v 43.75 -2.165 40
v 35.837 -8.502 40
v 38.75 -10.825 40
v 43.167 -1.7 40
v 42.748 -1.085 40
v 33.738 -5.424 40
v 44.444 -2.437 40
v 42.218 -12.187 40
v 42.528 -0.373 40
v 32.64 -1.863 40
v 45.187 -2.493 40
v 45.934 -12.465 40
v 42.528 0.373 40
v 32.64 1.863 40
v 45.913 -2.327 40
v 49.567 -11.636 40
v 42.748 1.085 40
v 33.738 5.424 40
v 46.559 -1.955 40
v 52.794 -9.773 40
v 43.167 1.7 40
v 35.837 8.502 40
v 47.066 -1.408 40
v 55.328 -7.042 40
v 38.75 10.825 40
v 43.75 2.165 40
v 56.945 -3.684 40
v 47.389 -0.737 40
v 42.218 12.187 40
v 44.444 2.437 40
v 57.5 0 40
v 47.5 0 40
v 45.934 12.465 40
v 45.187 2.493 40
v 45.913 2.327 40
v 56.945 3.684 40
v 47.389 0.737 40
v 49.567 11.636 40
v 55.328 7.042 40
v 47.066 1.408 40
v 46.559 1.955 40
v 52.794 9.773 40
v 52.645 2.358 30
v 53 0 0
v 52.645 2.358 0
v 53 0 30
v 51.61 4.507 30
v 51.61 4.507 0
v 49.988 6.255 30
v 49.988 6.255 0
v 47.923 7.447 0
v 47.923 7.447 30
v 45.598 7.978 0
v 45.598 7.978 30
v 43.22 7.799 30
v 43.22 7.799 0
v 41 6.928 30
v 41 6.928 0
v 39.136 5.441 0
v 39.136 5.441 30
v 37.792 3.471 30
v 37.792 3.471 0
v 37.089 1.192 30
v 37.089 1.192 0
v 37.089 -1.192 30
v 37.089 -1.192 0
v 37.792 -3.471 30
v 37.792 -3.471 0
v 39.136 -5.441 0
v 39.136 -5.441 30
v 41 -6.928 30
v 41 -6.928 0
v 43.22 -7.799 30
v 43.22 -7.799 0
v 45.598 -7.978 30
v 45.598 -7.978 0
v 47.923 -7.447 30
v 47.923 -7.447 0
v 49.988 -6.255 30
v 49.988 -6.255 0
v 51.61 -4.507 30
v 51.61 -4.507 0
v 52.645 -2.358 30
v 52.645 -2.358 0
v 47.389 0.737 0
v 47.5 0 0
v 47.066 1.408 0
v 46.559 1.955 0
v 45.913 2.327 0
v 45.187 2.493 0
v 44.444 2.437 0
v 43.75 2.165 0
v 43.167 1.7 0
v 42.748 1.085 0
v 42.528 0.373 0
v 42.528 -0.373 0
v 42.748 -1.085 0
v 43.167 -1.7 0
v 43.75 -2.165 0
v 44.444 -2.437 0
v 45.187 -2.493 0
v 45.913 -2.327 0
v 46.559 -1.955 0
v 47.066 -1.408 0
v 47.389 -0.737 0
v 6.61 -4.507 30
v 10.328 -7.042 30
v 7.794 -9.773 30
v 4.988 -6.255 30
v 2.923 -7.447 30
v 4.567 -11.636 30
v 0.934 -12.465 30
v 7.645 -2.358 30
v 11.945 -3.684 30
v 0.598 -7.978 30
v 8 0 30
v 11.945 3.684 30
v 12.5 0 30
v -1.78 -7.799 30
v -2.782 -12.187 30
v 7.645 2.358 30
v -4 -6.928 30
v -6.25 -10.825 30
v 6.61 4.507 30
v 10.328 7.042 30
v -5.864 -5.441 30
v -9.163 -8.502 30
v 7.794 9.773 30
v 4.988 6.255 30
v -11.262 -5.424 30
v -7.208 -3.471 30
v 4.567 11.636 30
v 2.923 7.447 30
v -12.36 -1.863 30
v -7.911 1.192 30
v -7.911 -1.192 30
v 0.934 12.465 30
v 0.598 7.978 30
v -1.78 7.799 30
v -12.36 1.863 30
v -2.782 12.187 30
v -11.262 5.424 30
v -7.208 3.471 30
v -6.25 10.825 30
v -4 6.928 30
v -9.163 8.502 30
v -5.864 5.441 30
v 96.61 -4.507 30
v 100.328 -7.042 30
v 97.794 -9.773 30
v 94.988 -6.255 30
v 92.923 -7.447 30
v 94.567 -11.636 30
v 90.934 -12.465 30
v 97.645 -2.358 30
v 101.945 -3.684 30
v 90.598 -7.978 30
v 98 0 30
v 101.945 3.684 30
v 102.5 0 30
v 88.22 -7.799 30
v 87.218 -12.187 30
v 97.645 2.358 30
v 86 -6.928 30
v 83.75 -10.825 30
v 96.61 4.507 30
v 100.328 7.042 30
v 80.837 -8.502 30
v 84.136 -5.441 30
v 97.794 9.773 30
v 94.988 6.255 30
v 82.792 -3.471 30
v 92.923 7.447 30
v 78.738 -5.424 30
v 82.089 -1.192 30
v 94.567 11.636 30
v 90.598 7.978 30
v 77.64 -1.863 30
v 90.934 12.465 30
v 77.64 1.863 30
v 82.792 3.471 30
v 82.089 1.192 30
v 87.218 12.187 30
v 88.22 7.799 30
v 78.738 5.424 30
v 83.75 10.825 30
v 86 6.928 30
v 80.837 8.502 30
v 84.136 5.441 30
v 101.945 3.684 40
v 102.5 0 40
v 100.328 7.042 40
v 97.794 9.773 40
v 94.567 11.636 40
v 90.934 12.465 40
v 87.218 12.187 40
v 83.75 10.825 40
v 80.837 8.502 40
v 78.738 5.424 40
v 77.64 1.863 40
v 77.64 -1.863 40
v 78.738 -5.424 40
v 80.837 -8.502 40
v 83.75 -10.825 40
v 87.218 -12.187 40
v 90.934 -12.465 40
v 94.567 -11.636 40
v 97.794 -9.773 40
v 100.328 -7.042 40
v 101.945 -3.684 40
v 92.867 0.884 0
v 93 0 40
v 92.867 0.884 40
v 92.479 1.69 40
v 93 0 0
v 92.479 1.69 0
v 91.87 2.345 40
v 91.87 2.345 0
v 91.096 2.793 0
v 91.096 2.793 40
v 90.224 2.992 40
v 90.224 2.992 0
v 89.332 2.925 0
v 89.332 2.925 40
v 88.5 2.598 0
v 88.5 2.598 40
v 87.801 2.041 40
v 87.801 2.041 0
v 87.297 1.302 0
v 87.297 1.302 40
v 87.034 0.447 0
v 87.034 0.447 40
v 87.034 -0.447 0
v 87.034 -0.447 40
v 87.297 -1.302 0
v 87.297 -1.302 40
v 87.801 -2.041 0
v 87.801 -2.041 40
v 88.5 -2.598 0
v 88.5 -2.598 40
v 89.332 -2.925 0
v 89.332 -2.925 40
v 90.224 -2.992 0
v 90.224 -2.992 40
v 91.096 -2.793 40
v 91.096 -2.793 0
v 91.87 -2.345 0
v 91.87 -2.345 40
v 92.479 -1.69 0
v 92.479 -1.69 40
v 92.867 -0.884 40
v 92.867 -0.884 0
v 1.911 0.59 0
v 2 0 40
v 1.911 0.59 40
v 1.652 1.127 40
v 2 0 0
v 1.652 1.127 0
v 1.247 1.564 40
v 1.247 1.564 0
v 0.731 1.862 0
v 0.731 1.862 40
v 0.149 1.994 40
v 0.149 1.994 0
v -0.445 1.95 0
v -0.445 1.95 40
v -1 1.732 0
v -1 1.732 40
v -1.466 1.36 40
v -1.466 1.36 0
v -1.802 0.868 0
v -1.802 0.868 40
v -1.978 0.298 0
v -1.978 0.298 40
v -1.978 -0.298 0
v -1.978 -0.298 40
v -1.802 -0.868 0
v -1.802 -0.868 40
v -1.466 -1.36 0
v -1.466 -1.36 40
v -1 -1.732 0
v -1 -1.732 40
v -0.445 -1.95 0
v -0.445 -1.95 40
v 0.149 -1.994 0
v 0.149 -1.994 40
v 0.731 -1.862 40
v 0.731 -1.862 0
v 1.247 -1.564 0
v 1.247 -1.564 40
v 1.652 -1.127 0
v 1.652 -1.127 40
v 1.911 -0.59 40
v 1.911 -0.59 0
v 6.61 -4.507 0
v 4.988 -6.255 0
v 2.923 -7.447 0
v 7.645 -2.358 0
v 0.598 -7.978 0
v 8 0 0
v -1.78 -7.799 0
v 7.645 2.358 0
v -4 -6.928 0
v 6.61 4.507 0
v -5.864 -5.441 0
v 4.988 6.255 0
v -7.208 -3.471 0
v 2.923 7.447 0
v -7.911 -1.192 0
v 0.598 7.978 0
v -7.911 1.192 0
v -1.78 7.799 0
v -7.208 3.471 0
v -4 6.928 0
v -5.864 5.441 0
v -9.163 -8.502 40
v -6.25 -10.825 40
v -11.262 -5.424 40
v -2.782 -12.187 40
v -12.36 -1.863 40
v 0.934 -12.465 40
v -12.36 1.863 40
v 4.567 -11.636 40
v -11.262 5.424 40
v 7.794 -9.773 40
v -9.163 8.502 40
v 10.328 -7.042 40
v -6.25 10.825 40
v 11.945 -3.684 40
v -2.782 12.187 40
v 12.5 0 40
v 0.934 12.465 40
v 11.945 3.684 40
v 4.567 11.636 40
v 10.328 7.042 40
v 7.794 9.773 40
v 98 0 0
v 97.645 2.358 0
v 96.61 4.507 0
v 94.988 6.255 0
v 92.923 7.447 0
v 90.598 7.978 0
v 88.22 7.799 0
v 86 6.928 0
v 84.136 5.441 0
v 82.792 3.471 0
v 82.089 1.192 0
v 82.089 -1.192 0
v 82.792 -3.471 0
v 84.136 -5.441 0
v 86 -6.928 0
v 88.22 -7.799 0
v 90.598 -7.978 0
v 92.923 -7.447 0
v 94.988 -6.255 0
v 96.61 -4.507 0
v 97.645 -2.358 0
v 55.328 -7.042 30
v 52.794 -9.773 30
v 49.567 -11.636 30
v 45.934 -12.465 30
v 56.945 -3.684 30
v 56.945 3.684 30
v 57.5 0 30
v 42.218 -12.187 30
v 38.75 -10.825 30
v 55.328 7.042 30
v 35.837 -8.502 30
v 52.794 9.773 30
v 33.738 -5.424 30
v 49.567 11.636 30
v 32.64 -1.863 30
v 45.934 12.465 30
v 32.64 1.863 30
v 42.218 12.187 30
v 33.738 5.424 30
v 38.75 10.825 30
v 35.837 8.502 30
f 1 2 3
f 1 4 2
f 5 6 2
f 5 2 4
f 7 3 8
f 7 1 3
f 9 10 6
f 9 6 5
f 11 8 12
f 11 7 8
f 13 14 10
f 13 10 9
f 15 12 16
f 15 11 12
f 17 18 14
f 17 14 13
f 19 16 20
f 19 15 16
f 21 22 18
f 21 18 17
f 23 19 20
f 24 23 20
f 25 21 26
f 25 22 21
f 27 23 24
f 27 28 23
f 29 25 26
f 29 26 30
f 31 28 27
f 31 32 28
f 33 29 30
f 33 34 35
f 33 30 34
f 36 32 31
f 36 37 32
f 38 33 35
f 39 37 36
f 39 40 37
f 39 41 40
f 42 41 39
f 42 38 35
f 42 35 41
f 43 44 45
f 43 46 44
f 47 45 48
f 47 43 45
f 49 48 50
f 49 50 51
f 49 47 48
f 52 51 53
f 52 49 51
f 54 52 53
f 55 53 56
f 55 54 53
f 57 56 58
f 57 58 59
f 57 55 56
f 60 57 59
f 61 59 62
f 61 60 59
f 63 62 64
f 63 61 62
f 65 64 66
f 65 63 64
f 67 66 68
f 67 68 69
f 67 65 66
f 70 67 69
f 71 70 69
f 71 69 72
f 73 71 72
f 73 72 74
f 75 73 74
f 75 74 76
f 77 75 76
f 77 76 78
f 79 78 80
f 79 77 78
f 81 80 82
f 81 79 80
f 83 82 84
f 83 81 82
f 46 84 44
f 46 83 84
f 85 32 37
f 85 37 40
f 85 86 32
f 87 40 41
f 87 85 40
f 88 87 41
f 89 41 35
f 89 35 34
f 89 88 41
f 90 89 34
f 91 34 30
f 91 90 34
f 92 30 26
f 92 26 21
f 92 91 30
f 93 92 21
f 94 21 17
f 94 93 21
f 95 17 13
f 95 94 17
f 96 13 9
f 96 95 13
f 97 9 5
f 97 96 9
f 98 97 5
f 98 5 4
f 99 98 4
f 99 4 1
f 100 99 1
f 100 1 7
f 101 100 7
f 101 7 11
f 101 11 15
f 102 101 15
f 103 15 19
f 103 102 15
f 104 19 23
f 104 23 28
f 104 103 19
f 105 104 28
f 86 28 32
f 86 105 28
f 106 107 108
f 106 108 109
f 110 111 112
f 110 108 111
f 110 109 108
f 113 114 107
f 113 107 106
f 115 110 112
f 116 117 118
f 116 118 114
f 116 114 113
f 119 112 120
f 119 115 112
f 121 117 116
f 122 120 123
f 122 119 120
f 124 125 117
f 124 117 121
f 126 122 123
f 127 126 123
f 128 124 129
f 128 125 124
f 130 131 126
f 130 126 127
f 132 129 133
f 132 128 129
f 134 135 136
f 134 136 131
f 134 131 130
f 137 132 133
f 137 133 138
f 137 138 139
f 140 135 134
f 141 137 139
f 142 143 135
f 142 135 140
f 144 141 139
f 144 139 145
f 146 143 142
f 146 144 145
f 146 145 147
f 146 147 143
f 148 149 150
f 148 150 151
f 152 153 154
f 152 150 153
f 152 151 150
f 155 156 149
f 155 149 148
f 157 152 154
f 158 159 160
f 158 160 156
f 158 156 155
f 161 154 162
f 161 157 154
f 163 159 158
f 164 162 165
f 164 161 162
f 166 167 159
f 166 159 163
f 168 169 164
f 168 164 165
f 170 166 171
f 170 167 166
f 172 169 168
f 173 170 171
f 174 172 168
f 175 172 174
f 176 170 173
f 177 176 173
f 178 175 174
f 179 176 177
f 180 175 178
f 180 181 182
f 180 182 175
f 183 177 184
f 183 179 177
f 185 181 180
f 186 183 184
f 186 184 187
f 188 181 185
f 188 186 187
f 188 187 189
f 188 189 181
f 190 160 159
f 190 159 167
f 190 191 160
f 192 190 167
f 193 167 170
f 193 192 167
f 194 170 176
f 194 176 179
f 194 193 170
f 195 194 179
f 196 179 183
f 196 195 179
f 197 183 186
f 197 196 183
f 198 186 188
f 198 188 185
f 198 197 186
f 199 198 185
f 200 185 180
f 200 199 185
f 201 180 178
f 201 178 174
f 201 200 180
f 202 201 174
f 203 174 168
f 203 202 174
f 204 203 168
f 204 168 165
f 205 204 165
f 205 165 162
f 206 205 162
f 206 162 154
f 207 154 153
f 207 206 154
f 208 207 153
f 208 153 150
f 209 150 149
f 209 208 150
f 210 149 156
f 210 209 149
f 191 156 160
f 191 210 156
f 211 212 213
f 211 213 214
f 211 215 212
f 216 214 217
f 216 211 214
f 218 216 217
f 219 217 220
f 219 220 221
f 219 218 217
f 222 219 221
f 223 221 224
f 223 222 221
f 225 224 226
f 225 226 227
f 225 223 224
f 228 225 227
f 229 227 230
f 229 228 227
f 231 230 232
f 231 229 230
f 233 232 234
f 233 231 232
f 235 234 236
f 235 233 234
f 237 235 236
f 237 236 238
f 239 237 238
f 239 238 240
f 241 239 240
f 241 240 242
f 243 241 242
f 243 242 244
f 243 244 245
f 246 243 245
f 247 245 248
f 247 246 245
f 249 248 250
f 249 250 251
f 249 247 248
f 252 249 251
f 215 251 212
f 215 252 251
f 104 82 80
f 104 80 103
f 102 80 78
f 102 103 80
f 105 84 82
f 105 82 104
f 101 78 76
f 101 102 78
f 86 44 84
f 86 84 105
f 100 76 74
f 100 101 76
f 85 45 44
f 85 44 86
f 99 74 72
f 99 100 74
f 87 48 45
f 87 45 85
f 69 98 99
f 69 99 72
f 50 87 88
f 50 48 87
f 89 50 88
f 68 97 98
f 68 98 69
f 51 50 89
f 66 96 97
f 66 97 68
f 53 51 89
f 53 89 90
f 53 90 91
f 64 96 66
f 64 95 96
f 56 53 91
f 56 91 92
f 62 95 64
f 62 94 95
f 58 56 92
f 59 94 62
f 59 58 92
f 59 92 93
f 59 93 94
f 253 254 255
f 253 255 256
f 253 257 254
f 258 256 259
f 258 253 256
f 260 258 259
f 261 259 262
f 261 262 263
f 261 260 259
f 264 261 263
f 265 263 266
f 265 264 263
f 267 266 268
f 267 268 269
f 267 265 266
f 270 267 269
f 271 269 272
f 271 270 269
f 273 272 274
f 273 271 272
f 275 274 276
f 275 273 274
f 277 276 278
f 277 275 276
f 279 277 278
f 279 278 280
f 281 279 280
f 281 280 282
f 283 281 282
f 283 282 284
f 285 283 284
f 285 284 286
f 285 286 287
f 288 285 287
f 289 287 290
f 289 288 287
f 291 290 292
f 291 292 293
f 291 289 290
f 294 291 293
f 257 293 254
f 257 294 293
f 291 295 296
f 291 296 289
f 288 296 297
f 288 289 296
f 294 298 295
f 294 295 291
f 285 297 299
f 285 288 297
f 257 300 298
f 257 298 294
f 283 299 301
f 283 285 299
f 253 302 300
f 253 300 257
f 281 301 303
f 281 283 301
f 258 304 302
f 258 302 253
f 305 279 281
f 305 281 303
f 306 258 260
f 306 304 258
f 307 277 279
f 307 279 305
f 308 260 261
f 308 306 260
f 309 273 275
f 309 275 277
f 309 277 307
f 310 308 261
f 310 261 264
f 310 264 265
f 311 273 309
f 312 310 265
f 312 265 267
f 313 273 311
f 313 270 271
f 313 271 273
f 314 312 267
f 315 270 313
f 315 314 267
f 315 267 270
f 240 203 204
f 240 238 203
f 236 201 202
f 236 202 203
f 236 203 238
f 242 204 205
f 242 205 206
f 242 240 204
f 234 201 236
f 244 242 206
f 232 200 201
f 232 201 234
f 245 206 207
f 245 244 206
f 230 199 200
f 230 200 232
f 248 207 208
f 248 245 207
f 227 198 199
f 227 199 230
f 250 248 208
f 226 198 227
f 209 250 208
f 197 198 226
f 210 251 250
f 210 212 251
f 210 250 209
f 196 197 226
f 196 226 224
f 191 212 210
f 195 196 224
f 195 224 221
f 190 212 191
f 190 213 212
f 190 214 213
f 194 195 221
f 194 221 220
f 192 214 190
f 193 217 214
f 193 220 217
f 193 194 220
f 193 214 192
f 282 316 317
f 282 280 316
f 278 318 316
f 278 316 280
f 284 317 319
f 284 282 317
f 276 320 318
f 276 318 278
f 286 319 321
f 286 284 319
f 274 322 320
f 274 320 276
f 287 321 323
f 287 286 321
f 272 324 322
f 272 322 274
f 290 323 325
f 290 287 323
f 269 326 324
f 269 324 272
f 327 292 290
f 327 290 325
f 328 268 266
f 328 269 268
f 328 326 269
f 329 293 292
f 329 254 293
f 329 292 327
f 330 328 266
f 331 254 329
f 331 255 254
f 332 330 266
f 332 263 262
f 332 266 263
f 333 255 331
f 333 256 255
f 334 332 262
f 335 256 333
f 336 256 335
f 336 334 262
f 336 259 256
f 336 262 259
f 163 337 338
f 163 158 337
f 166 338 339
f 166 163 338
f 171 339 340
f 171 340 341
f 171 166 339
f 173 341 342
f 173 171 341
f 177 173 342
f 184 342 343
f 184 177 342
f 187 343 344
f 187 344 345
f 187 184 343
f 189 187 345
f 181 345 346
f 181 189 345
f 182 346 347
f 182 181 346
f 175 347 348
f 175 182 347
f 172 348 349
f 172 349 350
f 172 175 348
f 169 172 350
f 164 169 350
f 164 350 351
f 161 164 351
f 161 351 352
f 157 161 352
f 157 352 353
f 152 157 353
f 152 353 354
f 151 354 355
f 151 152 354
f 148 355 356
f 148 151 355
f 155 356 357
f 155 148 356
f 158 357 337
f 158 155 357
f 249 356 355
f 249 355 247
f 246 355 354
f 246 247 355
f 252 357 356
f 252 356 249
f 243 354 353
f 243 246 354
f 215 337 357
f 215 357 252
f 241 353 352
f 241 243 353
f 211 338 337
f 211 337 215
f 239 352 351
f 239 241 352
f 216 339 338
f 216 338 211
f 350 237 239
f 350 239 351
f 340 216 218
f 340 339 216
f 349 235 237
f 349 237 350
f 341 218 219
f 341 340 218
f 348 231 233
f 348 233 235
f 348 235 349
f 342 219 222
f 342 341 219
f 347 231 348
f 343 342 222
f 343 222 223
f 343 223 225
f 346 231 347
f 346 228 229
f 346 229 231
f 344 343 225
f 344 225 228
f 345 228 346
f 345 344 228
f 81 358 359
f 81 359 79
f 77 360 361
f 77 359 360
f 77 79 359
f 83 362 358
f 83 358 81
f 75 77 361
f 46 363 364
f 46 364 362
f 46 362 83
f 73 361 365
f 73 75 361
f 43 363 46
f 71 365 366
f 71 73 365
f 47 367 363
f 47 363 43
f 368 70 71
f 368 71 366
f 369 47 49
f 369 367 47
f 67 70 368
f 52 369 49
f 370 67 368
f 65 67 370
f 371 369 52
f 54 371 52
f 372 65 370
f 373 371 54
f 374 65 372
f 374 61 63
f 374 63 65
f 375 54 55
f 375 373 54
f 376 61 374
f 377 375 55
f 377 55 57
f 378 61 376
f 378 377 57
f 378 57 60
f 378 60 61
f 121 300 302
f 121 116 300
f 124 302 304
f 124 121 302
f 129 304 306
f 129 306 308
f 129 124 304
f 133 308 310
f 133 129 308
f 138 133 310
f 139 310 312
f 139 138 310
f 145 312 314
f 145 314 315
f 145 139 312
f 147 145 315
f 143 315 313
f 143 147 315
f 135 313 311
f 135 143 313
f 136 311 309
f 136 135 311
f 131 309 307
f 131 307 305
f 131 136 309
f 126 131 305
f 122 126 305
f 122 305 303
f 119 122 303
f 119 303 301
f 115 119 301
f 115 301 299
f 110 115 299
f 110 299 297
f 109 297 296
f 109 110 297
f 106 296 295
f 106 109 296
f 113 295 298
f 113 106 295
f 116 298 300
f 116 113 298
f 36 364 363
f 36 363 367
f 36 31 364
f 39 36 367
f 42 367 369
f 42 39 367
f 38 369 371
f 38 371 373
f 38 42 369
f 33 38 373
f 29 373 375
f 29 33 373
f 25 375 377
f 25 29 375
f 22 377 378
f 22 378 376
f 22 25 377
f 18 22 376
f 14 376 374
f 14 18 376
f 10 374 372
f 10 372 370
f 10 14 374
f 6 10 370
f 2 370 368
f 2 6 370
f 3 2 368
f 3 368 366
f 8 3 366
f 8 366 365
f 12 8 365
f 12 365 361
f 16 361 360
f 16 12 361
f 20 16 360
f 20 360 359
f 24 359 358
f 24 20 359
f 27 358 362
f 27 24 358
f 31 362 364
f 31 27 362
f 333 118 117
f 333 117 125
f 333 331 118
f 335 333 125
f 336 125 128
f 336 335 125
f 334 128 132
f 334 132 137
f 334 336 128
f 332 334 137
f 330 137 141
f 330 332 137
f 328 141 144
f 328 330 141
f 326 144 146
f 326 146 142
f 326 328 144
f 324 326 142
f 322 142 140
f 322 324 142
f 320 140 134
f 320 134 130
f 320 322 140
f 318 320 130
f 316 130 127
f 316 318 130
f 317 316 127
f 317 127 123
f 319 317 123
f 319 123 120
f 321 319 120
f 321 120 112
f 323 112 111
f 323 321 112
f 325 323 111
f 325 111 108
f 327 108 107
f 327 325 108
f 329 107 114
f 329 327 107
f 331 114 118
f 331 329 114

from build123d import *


with BuildPart() as f1:
    # F0 (on Front) → F1 (revolve)
    with BuildSketch(Plane.XZ):
        Polygon((2, 0), (8, 0), (8, 30), (12.5, 30), (12.5, 40), (2, 40), align=None)
    revolve(axis=Axis((0, 0, 23.22392), (0, 0, 1)))


with BuildPart() as f3:
    # F2 (on Front) → F3 (revolve)
    with BuildSketch(Plane.XZ):
        Polygon((47.5, 30), (47.5, 0), (53, 0), (53, 30), (57.5, 30), (57.5, 40), (47.5, 40), align=None)
    revolve(axis=Axis((45, 0, 12.089669), (0, 0, 1)))


with BuildPart() as f5:
    # F4 (on Front) → F5 (revolve)
    with BuildSketch(Plane.XZ):
        Polygon((93, 30), (93, 0), (98, 0), (98, 30), (102.5, 30), (102.5, 40), (93, 40), align=None)
    revolve(axis=Axis((90, 0, 19.244505), (0, 0, 1)))


solid = Compound([f1.part, f3.part, f5.part])
